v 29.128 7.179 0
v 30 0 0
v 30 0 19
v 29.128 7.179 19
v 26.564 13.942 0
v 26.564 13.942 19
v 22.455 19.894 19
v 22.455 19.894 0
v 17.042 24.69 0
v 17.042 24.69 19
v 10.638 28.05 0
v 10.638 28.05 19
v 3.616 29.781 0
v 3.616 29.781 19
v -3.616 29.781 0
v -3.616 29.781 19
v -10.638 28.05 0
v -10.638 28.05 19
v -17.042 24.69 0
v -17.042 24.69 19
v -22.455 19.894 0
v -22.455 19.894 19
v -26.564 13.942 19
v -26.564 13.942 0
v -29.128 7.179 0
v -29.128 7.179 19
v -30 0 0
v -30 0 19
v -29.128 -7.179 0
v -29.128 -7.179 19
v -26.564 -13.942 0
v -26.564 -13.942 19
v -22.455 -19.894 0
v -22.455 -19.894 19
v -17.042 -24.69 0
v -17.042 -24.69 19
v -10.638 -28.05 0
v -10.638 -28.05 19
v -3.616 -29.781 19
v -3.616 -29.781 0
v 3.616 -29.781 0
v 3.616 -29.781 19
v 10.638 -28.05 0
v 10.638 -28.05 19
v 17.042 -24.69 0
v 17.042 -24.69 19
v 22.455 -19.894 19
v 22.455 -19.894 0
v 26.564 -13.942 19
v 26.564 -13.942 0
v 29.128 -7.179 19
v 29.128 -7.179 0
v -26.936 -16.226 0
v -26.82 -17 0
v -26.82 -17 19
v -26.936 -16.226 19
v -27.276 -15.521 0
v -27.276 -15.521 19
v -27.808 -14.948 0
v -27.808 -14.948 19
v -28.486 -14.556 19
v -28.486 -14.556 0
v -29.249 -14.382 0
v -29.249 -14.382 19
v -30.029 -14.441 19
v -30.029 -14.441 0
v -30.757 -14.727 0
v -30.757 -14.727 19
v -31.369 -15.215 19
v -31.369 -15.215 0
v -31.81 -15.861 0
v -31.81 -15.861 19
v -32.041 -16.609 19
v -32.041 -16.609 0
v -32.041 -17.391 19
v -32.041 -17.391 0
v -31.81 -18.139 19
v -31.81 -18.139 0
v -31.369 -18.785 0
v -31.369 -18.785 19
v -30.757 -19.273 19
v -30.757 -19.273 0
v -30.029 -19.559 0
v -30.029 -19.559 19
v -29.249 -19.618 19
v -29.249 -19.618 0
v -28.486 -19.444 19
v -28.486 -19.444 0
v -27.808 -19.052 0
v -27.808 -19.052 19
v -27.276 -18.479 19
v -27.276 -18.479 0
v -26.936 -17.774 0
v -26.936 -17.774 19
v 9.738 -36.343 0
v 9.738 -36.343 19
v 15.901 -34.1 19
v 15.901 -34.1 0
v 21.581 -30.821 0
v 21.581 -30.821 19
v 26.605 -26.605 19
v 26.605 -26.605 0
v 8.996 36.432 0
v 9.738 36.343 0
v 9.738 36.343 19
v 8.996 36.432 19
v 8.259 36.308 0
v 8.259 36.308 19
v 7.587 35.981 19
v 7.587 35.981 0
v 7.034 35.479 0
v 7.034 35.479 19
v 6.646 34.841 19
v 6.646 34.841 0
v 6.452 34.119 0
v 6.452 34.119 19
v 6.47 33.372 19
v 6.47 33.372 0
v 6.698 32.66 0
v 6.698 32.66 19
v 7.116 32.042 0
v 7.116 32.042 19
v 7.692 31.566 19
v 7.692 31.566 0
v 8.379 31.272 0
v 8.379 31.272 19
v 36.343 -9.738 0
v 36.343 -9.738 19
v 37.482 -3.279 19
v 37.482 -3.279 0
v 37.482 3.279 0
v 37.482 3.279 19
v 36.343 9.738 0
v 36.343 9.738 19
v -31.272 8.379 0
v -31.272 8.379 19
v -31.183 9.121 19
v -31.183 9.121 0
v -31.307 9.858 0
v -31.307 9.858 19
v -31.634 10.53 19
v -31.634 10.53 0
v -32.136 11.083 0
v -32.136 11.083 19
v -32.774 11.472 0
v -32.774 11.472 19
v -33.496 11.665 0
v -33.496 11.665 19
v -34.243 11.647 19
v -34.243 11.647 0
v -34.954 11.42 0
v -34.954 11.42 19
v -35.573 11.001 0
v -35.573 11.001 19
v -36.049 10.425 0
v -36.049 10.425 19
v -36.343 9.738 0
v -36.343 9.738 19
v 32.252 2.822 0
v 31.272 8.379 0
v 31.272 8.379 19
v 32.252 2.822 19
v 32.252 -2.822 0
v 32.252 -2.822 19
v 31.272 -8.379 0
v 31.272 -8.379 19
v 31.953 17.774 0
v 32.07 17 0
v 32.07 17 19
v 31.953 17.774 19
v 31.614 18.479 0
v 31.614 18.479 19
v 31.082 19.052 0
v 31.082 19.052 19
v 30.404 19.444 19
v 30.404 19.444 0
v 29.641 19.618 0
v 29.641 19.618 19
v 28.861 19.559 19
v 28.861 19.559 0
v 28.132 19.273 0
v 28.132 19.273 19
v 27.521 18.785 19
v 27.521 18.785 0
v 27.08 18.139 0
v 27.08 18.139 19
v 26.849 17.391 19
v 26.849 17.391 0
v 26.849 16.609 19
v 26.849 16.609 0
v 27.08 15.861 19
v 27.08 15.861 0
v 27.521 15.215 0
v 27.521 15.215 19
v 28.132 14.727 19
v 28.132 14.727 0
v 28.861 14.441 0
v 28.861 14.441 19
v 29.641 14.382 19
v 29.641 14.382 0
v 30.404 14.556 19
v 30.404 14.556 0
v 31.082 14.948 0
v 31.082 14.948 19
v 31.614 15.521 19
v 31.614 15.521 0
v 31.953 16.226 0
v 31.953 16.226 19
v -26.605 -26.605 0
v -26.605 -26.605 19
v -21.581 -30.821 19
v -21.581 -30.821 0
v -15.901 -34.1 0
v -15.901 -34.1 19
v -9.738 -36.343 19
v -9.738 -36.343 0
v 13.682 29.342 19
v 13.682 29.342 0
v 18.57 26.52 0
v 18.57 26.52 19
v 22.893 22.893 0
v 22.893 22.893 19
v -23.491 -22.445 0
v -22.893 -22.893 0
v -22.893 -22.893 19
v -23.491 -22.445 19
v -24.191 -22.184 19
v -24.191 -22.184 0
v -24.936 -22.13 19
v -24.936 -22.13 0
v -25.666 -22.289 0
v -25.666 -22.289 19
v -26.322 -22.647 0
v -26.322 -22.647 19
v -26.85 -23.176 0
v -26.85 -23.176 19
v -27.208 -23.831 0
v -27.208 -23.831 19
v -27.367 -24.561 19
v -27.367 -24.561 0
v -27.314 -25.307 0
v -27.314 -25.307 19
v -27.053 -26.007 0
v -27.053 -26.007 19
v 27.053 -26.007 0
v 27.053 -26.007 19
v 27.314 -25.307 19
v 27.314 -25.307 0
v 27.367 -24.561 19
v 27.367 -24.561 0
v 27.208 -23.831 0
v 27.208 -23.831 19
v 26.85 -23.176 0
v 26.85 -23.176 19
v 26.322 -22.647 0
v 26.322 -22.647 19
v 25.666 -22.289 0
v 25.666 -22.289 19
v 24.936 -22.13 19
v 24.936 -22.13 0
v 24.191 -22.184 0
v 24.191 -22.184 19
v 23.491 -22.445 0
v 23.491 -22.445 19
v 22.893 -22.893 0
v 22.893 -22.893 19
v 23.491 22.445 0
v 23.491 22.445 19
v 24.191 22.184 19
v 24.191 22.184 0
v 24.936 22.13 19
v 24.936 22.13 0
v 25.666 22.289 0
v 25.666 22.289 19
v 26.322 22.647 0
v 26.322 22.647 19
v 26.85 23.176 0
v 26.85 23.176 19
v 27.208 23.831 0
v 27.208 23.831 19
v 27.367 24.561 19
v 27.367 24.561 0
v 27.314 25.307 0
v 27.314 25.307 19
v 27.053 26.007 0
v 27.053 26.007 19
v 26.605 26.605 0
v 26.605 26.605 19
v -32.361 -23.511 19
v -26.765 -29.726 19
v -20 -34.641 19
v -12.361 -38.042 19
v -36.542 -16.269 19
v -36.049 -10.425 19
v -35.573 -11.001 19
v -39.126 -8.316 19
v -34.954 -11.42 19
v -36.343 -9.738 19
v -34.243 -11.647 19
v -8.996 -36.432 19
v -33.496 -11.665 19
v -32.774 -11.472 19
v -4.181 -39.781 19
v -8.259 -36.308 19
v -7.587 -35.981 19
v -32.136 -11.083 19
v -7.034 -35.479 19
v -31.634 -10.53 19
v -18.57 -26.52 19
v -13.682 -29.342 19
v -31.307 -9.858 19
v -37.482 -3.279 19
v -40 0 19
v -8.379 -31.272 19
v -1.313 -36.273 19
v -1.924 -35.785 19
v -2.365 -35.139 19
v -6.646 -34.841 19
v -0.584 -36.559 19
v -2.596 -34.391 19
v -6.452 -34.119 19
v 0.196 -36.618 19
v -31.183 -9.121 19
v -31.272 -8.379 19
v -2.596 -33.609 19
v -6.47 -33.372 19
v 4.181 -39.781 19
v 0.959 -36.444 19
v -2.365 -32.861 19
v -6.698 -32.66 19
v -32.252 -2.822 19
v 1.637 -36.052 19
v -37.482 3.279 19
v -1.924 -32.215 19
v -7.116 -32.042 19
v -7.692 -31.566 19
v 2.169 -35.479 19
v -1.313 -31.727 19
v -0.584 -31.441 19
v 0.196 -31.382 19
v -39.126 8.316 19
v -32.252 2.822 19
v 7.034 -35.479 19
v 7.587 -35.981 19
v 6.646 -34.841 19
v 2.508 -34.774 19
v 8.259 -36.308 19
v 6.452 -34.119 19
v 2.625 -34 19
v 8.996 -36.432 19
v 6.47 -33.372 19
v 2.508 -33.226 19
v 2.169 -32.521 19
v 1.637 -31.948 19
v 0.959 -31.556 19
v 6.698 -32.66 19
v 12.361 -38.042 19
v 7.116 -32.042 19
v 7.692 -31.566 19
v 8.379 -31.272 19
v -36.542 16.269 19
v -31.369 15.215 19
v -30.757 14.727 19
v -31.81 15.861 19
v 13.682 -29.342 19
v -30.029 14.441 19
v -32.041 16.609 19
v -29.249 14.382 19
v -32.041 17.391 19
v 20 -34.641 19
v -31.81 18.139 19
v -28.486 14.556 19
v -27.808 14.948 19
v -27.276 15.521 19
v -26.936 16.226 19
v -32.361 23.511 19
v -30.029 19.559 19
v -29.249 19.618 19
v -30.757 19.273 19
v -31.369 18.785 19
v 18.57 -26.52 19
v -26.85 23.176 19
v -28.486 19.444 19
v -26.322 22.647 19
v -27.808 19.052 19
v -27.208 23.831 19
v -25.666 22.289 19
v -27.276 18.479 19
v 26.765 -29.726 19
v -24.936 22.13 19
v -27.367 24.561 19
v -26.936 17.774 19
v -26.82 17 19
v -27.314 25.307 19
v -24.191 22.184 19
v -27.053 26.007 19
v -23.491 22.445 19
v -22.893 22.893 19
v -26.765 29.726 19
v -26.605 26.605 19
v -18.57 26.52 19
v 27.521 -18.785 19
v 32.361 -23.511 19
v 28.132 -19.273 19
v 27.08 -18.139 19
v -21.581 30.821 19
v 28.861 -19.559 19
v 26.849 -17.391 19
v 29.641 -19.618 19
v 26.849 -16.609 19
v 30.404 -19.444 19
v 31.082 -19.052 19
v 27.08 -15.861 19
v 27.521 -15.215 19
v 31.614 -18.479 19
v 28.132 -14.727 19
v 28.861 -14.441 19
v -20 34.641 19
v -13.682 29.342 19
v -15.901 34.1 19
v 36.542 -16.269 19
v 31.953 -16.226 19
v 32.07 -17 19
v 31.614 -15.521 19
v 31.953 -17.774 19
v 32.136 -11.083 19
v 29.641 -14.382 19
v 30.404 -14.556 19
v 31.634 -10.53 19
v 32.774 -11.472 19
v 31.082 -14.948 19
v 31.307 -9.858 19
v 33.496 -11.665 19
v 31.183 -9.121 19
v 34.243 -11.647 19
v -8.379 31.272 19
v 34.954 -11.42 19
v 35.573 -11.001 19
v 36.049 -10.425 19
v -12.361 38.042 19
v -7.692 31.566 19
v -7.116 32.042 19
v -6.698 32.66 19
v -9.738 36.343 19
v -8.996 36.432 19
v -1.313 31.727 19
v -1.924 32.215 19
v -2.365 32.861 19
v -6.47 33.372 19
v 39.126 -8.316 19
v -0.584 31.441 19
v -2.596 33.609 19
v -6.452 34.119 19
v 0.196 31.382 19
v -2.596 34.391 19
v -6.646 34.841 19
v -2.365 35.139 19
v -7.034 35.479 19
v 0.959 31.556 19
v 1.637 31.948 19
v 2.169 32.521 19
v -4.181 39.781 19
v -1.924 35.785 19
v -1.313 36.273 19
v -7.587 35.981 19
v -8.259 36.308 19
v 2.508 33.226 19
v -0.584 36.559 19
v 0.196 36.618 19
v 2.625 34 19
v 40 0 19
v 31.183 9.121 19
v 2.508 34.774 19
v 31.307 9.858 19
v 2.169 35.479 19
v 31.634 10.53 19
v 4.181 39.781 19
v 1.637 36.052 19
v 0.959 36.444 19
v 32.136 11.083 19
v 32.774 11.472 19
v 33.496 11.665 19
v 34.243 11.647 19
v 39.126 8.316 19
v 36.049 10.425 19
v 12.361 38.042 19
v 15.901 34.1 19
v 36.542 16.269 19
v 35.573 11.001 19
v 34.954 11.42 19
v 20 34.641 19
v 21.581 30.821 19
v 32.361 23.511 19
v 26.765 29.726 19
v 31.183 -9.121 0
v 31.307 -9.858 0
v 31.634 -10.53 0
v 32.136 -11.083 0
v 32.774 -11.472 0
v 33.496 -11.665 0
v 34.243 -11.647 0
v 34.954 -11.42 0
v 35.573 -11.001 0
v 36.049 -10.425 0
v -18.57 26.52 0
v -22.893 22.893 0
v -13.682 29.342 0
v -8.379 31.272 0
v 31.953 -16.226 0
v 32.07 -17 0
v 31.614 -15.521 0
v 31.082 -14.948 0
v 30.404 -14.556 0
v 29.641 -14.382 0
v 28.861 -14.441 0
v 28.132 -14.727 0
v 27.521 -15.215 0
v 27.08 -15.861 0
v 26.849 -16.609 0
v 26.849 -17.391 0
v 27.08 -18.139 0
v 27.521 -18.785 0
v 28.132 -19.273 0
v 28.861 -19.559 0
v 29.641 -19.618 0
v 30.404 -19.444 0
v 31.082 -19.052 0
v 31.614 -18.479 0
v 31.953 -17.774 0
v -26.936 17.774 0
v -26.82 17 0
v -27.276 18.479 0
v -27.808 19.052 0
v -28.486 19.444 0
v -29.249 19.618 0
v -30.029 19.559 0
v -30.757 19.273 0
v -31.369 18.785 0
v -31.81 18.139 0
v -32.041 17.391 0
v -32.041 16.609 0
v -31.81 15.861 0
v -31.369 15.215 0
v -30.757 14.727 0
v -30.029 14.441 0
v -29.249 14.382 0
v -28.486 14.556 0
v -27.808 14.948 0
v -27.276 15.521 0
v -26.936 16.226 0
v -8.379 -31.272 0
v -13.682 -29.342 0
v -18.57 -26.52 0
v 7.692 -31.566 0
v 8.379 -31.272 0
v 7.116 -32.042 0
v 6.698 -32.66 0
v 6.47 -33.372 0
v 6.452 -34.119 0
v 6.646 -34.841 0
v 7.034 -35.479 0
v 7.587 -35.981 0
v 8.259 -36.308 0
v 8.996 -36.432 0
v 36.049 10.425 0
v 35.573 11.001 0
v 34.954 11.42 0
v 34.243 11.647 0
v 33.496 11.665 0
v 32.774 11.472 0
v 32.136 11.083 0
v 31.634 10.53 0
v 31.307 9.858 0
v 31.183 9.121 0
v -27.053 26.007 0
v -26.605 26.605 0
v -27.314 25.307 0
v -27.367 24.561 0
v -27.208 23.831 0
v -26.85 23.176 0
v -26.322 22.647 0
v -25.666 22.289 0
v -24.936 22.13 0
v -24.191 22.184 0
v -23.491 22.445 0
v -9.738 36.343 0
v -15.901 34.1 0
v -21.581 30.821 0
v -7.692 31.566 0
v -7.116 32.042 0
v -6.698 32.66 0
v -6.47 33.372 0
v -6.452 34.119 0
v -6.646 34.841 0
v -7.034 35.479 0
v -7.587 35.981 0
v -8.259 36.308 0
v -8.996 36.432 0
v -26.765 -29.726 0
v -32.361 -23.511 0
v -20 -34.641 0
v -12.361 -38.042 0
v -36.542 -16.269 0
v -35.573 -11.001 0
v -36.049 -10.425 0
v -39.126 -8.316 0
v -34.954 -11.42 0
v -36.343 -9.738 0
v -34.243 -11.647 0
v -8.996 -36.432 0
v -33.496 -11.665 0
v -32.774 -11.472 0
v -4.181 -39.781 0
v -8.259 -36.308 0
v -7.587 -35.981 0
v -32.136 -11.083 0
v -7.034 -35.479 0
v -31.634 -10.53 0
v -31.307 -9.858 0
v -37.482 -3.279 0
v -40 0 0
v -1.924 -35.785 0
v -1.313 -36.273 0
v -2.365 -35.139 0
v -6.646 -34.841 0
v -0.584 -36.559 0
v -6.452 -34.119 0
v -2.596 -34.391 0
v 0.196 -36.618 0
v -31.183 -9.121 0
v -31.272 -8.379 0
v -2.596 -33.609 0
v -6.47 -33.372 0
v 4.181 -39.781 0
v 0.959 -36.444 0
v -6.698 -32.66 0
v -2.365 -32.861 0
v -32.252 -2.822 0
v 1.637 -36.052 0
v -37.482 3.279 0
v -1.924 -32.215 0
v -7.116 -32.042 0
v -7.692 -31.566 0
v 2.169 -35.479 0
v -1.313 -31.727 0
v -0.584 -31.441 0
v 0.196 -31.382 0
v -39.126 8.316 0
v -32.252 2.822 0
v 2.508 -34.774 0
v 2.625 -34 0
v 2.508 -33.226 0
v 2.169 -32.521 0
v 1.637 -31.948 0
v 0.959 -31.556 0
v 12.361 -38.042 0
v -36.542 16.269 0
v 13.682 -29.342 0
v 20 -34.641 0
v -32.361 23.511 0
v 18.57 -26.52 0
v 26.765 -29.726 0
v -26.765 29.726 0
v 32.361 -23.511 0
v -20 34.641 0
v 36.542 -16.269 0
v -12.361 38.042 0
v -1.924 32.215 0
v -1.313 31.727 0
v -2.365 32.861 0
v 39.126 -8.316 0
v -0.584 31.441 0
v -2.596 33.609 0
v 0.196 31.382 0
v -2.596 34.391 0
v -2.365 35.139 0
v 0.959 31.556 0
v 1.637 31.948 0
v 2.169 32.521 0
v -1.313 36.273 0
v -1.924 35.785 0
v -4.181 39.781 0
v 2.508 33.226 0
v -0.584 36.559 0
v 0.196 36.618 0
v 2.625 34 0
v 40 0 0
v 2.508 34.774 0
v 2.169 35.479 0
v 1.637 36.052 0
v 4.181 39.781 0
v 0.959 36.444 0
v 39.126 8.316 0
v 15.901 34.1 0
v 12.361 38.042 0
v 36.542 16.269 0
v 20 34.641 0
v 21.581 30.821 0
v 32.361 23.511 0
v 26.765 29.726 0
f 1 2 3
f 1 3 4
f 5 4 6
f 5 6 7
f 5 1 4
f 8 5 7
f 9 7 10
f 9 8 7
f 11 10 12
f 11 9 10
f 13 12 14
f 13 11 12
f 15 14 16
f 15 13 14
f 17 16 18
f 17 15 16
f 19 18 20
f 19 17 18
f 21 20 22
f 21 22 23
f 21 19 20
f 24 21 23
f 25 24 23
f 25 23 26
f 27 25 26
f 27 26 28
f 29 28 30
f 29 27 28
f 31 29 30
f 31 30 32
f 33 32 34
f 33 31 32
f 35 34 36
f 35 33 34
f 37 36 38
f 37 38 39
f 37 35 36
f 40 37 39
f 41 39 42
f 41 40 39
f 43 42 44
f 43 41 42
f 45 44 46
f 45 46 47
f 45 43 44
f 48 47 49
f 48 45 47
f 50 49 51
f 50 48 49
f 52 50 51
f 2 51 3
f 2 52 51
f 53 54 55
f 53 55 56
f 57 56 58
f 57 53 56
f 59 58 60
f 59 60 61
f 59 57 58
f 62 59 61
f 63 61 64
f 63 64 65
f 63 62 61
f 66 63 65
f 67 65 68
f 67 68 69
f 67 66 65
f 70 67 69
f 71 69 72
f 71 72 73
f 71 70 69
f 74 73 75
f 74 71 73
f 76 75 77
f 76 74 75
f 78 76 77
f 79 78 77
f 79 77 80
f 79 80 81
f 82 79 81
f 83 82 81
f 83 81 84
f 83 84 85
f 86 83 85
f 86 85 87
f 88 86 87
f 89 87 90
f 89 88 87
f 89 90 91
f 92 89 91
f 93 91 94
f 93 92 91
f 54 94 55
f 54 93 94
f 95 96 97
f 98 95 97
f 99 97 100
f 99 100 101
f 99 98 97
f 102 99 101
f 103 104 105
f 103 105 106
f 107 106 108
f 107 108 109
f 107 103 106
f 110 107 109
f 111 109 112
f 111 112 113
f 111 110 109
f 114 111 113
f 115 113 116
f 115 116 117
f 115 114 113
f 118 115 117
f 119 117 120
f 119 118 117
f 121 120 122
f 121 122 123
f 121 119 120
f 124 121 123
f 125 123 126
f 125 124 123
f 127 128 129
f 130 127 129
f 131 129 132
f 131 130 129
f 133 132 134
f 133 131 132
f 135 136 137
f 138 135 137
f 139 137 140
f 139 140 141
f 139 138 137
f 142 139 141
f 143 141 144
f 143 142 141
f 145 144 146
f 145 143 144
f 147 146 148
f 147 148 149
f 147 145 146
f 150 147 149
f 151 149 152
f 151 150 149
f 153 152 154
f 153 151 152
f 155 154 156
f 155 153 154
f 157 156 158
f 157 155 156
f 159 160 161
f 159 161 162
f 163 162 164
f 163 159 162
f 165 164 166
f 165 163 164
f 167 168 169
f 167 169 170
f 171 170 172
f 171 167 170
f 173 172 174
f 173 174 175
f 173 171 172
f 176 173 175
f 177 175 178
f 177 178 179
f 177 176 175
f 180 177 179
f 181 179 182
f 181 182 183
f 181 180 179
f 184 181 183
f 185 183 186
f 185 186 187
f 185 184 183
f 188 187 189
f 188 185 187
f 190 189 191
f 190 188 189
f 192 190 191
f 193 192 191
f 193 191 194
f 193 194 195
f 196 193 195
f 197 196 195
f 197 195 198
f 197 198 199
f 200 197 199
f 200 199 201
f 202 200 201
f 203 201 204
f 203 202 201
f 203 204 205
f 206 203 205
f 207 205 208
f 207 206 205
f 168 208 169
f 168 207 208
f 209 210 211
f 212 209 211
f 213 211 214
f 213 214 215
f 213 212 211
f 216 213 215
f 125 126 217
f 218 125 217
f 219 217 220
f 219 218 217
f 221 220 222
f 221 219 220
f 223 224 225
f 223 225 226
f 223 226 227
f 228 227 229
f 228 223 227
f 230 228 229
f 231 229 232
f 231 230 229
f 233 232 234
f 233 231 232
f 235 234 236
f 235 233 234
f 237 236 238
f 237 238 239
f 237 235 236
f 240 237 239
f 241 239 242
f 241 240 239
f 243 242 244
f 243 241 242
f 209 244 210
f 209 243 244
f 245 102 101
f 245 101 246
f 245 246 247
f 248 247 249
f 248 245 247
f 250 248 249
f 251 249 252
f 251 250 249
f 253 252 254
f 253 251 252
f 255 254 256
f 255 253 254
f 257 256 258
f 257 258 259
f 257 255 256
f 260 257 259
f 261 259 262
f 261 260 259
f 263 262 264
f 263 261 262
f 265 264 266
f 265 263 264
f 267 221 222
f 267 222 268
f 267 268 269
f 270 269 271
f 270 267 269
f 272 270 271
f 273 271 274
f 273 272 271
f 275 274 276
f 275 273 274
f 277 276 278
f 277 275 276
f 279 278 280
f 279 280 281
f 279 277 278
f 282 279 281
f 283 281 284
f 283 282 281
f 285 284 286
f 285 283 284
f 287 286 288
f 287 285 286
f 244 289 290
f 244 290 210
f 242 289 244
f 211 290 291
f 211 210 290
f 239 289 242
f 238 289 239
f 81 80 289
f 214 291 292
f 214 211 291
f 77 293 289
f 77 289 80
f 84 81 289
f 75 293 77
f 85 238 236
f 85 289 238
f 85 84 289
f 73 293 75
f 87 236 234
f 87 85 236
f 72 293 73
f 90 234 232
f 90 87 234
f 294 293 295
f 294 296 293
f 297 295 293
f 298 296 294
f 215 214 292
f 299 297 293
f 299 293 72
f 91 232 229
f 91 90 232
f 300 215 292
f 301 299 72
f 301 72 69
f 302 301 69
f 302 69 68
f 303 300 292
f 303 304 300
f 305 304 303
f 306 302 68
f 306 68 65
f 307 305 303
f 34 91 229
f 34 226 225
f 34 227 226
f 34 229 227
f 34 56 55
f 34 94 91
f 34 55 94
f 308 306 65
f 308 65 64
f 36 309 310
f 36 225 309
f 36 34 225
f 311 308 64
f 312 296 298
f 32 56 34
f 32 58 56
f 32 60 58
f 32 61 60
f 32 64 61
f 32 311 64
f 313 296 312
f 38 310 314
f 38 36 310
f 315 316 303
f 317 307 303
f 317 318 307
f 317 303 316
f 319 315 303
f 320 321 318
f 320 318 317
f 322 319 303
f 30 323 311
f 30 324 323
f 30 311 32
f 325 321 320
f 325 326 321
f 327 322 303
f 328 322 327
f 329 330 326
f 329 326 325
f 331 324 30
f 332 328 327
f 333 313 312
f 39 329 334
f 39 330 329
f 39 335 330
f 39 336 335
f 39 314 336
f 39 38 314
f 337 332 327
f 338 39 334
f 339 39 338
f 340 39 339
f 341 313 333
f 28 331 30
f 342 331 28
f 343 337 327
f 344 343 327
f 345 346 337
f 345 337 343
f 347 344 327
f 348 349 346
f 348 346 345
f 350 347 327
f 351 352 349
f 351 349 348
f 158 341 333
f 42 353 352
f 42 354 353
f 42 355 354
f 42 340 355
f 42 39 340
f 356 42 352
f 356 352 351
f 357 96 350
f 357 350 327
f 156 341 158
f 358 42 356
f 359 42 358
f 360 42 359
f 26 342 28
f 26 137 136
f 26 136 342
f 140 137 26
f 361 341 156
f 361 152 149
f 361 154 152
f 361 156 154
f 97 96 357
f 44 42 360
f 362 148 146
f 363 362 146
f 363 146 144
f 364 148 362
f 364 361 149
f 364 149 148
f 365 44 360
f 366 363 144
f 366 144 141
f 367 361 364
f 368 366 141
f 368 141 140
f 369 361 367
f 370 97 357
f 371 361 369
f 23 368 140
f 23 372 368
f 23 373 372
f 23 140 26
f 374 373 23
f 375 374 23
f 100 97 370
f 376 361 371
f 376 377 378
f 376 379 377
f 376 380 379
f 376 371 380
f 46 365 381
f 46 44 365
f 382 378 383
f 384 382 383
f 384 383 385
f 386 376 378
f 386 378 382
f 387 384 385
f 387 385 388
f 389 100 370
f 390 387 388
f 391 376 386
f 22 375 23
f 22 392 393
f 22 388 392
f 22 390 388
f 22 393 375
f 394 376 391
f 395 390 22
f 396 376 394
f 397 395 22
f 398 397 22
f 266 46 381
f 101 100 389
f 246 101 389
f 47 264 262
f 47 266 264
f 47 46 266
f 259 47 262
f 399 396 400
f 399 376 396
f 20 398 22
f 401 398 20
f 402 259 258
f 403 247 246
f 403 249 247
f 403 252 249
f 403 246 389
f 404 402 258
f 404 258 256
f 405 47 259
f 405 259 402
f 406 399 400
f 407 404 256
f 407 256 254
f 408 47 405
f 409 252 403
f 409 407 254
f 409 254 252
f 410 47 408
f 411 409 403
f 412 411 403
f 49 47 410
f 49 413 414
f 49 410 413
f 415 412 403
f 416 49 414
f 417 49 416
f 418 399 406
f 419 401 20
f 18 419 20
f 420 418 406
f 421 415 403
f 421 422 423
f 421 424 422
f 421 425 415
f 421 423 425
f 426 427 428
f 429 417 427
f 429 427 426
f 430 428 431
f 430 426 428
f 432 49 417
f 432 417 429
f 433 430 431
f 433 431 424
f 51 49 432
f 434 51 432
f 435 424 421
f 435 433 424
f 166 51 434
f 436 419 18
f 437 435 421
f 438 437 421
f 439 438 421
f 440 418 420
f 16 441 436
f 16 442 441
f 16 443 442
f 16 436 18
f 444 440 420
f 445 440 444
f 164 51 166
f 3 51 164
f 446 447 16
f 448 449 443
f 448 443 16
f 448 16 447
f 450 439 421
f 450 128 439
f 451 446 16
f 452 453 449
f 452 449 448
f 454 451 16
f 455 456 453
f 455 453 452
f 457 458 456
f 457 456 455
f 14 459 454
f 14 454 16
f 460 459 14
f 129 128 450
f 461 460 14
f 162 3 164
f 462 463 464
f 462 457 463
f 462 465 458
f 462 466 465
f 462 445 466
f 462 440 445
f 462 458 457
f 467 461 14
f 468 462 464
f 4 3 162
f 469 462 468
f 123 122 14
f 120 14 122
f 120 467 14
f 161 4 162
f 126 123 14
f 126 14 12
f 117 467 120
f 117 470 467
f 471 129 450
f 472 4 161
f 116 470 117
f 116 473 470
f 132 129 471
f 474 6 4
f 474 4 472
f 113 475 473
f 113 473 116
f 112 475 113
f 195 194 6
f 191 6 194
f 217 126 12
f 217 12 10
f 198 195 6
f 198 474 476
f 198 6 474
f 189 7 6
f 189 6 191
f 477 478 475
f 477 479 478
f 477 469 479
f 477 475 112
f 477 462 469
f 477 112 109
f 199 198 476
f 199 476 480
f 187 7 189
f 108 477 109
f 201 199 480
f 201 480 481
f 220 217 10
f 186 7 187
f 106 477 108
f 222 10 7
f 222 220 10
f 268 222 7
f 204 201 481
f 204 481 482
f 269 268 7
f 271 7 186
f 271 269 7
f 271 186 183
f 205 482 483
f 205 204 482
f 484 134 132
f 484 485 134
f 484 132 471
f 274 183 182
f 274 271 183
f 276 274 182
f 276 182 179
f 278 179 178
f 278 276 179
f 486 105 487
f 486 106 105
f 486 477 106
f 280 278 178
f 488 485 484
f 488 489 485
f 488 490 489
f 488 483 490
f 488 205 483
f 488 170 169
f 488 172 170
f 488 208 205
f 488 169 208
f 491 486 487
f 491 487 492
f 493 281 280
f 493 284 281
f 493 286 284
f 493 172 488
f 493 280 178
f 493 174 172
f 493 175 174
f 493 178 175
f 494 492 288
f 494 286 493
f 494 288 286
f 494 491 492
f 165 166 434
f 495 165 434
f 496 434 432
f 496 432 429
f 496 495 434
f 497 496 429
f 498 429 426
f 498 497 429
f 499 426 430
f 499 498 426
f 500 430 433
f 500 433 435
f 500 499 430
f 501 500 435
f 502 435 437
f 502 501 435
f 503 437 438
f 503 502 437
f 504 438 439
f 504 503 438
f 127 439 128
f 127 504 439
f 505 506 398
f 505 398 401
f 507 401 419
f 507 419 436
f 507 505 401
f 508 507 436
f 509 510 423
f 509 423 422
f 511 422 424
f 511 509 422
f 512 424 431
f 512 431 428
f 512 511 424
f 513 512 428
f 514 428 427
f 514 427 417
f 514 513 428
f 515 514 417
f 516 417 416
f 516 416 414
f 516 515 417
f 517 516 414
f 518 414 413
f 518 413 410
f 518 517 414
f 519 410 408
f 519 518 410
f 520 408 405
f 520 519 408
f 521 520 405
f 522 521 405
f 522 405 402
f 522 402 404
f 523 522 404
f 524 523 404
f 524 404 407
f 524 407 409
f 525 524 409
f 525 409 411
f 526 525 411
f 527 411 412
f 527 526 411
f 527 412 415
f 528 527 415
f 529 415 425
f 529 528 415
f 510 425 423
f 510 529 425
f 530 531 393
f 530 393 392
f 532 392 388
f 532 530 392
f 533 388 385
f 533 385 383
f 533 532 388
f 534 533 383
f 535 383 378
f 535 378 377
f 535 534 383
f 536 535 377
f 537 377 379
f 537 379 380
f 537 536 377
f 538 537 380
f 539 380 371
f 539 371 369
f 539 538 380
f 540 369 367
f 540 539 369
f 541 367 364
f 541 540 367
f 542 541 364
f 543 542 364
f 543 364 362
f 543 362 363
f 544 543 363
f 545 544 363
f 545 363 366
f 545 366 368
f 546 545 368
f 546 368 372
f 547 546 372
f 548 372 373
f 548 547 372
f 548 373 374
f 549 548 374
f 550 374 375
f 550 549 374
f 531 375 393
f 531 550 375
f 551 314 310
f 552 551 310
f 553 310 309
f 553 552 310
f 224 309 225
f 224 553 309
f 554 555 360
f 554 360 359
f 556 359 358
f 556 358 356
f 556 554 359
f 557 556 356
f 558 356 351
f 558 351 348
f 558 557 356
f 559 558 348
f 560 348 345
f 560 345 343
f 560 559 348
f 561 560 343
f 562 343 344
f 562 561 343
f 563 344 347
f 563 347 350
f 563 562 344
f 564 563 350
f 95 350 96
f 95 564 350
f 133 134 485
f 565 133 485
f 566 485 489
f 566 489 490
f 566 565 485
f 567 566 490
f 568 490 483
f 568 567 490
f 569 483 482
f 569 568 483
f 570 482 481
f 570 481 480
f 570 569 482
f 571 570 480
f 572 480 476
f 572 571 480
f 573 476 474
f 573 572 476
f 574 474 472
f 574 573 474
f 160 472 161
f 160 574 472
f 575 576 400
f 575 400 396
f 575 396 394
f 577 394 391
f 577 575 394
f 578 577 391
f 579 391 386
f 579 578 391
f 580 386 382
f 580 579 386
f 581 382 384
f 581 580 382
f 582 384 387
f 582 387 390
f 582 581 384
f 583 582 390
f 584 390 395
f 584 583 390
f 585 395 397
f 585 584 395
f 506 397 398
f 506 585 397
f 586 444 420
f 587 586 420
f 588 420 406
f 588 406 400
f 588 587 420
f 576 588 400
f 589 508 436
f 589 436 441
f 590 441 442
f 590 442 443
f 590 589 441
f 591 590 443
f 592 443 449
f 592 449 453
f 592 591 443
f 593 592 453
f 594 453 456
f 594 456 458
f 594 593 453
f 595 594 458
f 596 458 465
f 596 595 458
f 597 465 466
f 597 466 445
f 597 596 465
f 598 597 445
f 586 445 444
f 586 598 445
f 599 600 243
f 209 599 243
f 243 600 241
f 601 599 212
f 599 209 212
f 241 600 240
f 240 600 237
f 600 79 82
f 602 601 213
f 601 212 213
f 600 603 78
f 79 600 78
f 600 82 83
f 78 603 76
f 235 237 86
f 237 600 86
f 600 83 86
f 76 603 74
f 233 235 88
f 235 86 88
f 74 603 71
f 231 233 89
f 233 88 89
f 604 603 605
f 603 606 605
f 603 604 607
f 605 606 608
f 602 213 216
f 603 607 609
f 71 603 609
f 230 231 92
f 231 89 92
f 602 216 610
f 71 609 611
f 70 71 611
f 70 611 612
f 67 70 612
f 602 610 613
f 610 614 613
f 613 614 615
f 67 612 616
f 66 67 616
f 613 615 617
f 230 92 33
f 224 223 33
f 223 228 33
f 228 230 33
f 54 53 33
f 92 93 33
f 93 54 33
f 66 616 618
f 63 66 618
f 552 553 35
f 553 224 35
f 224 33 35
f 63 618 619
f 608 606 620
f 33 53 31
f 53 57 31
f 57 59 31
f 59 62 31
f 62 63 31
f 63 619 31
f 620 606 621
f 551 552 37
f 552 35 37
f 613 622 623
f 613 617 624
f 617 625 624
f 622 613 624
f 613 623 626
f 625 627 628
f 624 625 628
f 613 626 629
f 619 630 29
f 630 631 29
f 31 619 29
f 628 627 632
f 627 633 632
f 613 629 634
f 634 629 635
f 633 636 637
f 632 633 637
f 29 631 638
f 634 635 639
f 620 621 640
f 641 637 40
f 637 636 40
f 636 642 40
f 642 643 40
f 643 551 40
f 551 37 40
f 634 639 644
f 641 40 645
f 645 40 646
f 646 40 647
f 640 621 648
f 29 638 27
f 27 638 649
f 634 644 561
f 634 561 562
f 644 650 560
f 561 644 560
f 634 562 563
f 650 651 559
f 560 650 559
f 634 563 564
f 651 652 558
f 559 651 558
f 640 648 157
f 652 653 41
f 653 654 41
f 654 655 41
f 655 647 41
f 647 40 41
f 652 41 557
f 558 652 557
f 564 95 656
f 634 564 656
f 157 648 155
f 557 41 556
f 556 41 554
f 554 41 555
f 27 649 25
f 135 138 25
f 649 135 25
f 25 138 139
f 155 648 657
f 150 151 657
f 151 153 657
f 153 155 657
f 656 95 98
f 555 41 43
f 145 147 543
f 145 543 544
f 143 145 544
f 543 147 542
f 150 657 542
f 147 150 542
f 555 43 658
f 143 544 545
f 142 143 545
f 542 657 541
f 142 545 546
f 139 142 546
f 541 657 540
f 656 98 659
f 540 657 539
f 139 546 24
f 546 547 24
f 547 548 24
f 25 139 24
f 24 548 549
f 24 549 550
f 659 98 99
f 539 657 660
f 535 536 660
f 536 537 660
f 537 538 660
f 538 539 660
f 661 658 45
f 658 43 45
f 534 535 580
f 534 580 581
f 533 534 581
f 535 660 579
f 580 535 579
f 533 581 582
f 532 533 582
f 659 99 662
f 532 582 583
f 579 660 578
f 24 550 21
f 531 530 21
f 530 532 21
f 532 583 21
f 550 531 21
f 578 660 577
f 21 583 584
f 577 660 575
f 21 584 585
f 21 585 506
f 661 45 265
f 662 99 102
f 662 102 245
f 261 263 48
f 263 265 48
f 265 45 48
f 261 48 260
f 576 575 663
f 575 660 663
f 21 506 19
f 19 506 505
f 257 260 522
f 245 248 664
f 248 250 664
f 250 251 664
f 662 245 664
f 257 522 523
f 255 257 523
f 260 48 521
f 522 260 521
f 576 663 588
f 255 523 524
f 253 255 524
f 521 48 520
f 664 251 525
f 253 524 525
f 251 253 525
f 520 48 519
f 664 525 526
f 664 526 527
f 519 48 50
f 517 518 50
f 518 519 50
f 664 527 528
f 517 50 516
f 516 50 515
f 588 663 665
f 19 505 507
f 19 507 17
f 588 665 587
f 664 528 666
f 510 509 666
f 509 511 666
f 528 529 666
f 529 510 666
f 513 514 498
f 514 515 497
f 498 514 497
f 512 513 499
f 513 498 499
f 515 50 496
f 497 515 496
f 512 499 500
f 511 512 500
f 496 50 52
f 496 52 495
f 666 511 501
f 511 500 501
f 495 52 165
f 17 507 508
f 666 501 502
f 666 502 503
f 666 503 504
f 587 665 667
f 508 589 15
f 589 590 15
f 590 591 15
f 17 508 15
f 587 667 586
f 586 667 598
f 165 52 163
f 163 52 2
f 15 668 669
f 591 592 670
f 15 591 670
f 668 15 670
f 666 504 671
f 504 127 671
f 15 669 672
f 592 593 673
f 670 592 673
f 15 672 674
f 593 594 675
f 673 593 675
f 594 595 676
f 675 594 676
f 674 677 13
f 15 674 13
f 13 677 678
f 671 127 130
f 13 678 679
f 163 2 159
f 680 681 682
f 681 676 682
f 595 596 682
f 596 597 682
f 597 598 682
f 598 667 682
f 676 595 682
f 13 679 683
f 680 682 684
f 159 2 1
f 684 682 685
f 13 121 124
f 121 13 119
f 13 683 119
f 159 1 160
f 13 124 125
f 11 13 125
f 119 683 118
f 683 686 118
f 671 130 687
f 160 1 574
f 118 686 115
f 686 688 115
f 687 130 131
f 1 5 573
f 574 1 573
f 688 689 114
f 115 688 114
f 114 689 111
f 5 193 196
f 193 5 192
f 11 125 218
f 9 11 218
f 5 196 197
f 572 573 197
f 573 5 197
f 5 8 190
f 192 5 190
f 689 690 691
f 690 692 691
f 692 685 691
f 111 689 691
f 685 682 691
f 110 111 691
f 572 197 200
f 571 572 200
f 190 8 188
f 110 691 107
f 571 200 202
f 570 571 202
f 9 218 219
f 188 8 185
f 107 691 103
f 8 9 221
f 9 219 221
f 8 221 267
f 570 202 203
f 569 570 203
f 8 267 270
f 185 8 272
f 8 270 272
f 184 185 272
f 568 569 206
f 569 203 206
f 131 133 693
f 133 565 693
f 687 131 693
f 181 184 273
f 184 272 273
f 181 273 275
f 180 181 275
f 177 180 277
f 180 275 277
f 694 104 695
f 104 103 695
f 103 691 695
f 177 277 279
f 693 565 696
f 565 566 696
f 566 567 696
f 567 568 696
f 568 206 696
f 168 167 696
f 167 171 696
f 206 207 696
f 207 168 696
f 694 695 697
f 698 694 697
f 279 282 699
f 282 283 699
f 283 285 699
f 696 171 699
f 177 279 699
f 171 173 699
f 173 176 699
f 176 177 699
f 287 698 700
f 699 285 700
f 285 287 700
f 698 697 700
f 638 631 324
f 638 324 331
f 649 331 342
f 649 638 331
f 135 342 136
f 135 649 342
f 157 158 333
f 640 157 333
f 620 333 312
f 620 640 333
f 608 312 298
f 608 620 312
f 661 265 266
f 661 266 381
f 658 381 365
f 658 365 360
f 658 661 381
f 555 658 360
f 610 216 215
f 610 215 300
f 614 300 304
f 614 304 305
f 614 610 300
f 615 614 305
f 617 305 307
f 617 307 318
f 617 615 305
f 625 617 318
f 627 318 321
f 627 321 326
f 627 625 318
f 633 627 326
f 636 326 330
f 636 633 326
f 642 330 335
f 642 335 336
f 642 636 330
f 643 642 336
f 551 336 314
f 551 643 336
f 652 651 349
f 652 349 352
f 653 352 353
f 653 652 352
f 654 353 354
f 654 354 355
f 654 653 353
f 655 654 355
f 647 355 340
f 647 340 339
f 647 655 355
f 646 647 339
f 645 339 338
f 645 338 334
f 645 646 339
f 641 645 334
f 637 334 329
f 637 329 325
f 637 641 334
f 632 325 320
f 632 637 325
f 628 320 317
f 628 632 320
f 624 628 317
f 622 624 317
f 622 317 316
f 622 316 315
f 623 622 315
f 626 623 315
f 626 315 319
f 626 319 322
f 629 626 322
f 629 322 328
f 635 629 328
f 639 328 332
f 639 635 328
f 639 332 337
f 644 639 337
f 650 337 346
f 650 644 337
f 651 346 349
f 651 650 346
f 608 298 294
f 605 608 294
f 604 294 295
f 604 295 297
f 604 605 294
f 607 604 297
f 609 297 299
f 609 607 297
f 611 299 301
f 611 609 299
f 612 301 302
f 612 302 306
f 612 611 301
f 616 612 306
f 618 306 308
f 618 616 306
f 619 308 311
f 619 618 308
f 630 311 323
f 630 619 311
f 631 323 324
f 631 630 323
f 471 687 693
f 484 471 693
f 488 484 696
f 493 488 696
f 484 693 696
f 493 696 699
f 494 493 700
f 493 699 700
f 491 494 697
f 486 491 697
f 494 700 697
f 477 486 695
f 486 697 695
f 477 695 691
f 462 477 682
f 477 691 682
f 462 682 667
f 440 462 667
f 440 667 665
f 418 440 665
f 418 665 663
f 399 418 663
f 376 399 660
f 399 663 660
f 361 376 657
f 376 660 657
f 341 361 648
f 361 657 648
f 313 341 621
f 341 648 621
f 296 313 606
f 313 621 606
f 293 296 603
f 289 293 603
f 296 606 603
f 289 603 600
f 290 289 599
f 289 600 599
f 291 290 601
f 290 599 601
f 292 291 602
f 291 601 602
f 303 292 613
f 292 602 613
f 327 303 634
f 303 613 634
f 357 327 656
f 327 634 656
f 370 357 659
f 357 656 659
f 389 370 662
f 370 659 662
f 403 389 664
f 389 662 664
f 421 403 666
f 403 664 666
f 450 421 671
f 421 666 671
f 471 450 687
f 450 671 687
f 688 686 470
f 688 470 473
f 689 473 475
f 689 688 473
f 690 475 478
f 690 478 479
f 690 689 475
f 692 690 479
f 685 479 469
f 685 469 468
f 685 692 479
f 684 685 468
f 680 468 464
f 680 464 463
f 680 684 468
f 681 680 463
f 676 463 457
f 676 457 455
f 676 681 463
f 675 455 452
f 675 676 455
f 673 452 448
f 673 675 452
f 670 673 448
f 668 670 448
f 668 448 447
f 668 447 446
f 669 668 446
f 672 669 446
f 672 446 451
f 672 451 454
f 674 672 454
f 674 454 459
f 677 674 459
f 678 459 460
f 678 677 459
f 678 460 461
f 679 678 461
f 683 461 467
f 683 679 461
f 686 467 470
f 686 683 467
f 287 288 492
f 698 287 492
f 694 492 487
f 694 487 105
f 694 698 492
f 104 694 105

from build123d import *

# Parameters (mm, degrees)
SKETCH1_R           = 40
SKETCH1_R_2         = 30
SKETCH1_R_3         = 2.625
BOSS_EXTRUDE1_DEPTH = 19


with BuildPart() as part:
    # Sketch1 → Boss-Extrude1 (new body)
    with BuildSketch(Plane.XY):
        Circle(SKETCH1_R)
        Circle(SKETCH1_R_2, mode=Mode.SUBTRACT)
        with Locations((0, 34)):
            Circle(SKETCH1_R_3, mode=Mode.SUBTRACT)
        with Locations((29.444863729, 17)):
            Circle(SKETCH1_R_3, mode=Mode.SUBTRACT)
        with Locations((29.444863729, -17)):
            Circle(SKETCH1_R_3, mode=Mode.SUBTRACT)
        with Locations((0, -34)):
            Circle(SKETCH1_R_3, mode=Mode.SUBTRACT)
        with Locations((-29.444863729, -17)):
            Circle(SKETCH1_R_3, mode=Mode.SUBTRACT)
        with Locations((-29.444863729, 17)):
            Circle(SKETCH1_R_3, mode=Mode.SUBTRACT)
        with BuildLine():
            ThreePointArc((-9.738066572, 36.342959214), (-18.8125, 32.584205817), (-26.604892642, 26.604892642))
            ThreePointArc((-26.604892642, 26.604892642), (-26.604892642, 22.892582041), (-22.892582041, 22.892582041))
            ThreePointArc((-22.892582041, 22.892582041), (-16.1875, 28.037572448), (-8.379266585, 31.271848626))
            ThreePointArc((-8.379266585, 31.271848626), (-6.523111285, 34.486803914), (-9.738066572, 36.342959214))
        make_face(mode=Mode.SUBTRACT)
        with BuildLine():
            ThreePointArc((26.604892642, 26.604892642), (18.8125, 32.584205817), (9.738066572, 36.342959214))
            ThreePointArc((9.738066572, 36.342959214), (6.523111285, 34.486803914), (8.379266585, 31.271848626))
            ThreePointArc((8.379266585, 31.271848626), (16.1875, 28.037572448), (22.892582041, 22.892582041))
            ThreePointArc((22.892582041, 22.892582041), (26.604892642, 22.892582041), (26.604892642, 26.604892642))
        make_face(mode=Mode.SUBTRACT)
        with BuildLine():
            ThreePointArc((36.342959214, -9.738066572), (37.625, 0), (36.342959214, 9.738066572))
            ThreePointArc((36.342959214, 9.738066572), (33.128003927, 11.594221873), (31.271848626, 8.379266585))
            ThreePointArc((31.271848626, 8.379266585), (32.375, 0), (31.271848626, -8.379266585))
            ThreePointArc((31.271848626, -8.379266585), (33.128003927, -11.594221873), (36.342959214, -9.738066572))
        make_face(mode=Mode.SUBTRACT)
        with BuildLine():
            ThreePointArc((9.738066572, -36.342959214), (18.8125, -32.584205817), (26.604892642, -26.604892642))
            ThreePointArc((26.604892642, -26.604892642), (26.604892642, -22.892582041), (22.892582041, -22.892582041))
            ThreePointArc((22.892582041, -22.892582041), (16.1875, -28.037572448), (8.379266585, -31.271848626))
            ThreePointArc((8.379266585, -31.271848626), (6.523111285, -34.486803914), (9.738066572, -36.342959214))
        make_face(mode=Mode.SUBTRACT)
        with BuildLine():
            ThreePointArc((-26.604892642, -26.604892642), (-18.8125, -32.584205817), (-9.738066572, -36.342959214))
            ThreePointArc((-9.738066572, -36.342959214), (-6.523111285, -34.486803914), (-8.379266585, -31.271848626))
            ThreePointArc((-8.379266585, -31.271848626), (-16.1875, -28.037572448), (-22.892582041, -22.892582041))
            ThreePointArc((-22.892582041, -22.892582041), (-26.604892642, -22.892582041), (-26.604892642, -26.604892642))
        make_face(mode=Mode.SUBTRACT)
        with BuildLine():
            ThreePointArc((-36.342959214, 9.738066572), (-37.625, 0), (-36.342959214, -9.738066572))
            ThreePointArc((-36.342959214, -9.738066572), (-33.128003927, -11.594221873), (-31.271848626, -8.379266585))
            ThreePointArc((-31.271848626, -8.379266585), (-32.375, 0), (-31.271848626, 8.379266585))
            ThreePointArc((-31.271848626, 8.379266585), (-33.128003927, 11.594221873), (-36.342959214, 9.738066572))
        make_face(mode=Mode.SUBTRACT)
    extrude(amount=BOSS_EXTRUDE1_DEPTH)


solid = part.part
